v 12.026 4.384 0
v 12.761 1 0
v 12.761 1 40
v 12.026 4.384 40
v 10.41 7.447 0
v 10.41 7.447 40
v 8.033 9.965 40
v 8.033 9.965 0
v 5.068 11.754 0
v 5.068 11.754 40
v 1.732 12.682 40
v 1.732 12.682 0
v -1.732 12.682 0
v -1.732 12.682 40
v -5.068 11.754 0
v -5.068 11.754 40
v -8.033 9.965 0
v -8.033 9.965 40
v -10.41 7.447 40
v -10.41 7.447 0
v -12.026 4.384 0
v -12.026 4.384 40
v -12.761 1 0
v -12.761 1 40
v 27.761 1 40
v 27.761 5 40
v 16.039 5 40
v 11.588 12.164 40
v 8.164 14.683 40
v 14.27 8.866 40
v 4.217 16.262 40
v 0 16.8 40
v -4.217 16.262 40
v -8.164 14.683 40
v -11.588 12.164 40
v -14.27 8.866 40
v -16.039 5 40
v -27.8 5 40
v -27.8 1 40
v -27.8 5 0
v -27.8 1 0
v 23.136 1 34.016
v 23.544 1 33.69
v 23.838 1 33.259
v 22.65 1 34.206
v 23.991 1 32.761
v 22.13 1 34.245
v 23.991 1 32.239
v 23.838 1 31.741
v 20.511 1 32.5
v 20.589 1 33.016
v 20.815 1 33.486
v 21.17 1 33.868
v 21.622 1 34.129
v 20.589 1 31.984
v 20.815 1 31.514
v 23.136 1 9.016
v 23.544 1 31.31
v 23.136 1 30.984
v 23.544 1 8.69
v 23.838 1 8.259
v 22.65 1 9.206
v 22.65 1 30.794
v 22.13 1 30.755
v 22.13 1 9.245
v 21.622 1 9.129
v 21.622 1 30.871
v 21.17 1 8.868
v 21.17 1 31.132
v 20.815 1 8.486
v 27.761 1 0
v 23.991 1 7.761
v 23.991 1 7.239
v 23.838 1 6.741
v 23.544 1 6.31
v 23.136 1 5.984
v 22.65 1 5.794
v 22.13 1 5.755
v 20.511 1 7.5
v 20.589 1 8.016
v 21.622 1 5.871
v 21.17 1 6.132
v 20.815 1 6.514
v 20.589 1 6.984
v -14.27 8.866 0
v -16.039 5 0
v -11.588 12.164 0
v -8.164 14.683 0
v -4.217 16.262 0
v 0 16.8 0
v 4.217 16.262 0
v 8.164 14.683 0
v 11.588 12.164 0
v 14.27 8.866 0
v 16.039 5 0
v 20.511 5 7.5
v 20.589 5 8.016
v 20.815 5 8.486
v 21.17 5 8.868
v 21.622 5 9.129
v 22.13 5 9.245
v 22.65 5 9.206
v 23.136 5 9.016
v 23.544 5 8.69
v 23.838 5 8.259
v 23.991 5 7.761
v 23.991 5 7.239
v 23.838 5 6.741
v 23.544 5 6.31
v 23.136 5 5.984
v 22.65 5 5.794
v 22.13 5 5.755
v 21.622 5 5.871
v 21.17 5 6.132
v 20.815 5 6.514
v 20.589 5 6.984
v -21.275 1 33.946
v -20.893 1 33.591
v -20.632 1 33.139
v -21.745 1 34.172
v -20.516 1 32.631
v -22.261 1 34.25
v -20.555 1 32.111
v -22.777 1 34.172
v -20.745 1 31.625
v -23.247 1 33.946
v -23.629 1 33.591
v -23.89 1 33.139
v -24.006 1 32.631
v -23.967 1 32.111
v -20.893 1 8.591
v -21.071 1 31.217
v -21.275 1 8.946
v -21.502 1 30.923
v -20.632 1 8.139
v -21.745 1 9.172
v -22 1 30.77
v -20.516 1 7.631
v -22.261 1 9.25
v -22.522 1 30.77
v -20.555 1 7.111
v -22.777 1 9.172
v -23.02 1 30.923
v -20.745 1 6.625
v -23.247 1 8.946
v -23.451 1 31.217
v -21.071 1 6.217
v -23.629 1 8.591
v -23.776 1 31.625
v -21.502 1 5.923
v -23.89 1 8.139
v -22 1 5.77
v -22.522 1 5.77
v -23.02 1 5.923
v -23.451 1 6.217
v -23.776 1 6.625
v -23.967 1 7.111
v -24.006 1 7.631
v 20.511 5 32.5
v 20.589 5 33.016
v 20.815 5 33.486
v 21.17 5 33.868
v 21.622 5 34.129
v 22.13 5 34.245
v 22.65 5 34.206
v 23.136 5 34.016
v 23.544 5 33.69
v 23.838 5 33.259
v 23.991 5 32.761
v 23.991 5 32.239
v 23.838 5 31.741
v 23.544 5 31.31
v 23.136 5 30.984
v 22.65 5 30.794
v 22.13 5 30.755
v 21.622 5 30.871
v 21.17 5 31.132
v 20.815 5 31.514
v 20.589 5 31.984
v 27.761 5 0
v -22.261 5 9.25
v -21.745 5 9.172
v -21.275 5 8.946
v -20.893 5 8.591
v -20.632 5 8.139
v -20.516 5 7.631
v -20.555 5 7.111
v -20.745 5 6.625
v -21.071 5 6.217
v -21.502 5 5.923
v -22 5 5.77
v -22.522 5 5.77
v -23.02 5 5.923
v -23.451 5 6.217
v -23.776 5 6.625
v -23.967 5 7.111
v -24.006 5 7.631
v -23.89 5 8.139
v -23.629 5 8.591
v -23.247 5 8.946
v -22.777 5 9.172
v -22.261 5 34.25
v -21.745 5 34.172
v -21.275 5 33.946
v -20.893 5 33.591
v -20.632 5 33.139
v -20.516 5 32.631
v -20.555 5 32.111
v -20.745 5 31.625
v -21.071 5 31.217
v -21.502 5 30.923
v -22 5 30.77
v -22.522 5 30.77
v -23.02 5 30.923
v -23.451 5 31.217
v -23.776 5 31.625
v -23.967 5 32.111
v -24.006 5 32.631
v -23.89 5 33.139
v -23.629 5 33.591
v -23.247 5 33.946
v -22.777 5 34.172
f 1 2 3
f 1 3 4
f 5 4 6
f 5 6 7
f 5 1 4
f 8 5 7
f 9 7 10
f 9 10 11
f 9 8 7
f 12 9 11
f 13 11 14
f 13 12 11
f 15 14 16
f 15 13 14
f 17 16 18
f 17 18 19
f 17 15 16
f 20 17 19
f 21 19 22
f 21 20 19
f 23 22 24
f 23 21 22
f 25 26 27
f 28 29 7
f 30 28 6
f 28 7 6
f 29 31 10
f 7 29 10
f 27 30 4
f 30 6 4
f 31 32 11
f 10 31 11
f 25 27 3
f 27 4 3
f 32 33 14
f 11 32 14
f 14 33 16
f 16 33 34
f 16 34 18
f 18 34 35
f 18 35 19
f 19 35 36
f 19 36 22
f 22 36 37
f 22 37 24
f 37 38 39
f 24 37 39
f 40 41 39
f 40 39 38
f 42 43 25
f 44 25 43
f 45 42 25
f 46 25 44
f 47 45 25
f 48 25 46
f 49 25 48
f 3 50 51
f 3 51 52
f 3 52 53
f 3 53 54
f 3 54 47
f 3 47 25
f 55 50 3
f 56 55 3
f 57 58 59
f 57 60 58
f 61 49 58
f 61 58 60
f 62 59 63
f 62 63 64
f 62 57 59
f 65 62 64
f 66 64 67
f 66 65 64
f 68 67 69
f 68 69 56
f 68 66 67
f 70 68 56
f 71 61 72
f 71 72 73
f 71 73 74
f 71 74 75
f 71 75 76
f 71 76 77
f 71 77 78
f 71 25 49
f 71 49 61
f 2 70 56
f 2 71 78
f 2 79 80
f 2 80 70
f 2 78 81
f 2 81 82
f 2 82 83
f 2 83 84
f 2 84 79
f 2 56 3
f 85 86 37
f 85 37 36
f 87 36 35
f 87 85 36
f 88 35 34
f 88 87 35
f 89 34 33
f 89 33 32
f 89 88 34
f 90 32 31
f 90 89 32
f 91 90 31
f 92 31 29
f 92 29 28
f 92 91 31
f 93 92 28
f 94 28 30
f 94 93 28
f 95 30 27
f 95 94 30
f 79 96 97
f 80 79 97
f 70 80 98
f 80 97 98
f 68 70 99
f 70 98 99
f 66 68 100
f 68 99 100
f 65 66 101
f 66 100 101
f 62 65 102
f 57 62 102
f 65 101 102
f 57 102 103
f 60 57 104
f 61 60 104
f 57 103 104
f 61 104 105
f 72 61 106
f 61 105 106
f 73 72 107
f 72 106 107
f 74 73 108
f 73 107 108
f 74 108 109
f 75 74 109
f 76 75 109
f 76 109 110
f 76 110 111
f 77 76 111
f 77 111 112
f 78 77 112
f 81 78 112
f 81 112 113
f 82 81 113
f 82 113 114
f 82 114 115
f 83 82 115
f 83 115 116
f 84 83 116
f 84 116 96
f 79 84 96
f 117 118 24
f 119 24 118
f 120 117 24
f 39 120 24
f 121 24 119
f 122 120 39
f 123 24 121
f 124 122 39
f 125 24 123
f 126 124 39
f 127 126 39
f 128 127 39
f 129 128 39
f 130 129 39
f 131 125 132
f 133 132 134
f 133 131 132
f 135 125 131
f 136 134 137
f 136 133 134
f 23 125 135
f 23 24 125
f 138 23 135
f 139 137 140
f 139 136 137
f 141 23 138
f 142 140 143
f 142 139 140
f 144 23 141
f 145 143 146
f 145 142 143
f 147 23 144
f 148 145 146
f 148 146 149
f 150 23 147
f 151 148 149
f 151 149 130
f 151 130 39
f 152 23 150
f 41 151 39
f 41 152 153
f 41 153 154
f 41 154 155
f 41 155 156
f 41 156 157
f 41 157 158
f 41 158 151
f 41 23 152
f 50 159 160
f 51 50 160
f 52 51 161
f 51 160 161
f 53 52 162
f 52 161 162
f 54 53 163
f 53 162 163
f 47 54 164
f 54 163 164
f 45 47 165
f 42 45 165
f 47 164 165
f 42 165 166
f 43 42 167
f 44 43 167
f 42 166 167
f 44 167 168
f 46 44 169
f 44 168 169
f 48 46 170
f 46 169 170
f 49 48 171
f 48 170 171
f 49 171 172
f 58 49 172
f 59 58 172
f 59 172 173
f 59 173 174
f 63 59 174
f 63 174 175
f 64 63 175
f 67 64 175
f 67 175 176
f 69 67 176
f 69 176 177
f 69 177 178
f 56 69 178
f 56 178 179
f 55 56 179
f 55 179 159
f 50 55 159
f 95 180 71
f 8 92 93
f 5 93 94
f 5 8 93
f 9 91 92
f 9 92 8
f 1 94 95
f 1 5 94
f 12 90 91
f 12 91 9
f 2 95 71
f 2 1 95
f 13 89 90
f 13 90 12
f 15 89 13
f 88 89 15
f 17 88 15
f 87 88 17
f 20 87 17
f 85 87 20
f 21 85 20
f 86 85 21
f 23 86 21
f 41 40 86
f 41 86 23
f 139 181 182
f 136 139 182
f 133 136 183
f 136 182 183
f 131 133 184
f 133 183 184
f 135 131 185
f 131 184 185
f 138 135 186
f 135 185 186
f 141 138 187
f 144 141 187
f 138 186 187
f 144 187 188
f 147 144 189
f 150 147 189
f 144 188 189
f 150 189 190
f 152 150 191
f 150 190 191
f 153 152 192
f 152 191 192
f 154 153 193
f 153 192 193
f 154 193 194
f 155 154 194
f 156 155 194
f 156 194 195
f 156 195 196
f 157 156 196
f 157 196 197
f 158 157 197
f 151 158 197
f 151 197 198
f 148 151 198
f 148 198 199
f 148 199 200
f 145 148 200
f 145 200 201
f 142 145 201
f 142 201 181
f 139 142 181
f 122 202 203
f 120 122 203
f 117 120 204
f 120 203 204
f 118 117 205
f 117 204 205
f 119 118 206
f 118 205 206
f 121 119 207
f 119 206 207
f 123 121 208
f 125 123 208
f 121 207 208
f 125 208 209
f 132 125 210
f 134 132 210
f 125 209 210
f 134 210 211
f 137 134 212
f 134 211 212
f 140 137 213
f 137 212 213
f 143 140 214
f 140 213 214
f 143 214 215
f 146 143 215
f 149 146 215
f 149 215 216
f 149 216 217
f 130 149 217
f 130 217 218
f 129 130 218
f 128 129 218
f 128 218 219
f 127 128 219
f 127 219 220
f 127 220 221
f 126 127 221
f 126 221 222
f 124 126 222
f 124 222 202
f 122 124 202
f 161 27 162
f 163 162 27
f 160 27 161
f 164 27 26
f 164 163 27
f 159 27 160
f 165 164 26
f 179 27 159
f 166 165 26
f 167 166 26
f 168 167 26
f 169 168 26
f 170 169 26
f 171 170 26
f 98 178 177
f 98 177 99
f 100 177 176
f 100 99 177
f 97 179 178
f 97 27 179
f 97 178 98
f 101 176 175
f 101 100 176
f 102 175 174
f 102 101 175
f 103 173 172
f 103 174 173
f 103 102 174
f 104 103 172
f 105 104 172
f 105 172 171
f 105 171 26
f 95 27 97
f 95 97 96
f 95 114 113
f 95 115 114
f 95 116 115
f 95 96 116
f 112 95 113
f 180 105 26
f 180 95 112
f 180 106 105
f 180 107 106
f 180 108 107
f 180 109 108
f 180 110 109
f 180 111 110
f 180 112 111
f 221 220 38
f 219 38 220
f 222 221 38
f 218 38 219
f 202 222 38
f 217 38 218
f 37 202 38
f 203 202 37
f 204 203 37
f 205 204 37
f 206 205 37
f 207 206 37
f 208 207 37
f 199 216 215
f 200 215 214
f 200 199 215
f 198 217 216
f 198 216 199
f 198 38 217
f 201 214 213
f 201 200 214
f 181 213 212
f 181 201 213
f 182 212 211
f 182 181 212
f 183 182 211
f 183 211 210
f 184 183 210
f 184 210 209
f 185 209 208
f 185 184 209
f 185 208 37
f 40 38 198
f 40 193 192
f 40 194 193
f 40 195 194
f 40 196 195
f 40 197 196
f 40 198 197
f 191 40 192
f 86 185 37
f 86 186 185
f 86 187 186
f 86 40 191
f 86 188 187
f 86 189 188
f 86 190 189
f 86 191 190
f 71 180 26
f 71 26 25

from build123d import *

# Parameters (mm, degrees)
BOSS_EXTRUDE1_DEPTH = 40
CUT_EXTRUDE1_REACH  = 52.121
SKETCH2_R           = 1.75


with BuildPart() as part:
    # Sketch1 → Boss-Extrude1 (new body)
    with BuildSketch(Plane(origin=(0, 0, 0), x_dir=(0, 1, 0), z_dir=(0, 0, 1))):
        with BuildLine():
            Line((1, 12.760877713), (1, 27.8))
            Line((1, 27.8), (5, 27.8))
            Line((5, 27.8), (5, 16.038703189))
            ThreePointArc((5, 16.038703189), (16.8, 0), (5, -16.038703189))
            Line((5, -16.038703189), (5, -27.760877713))
            Line((5, -27.760877713), (1, -27.760877713))
            Line((1, -27.760877713), (1, -12.760877713))
            ThreePointArc((1, -12.760877713), (12.8, 0), (1, 12.760877713))
        make_face()
    extrude(amount=BOSS_EXTRUDE1_DEPTH)

    # Sketch2 → Cut-Extrude1 (cut, up to next)
    with BuildSketch(Plane(origin=(0, 5, 0), x_dir=(-1, 0, 0), z_dir=(0, 1, 0)), mode=Mode.PRIVATE) as cut_extrude1_sk1:
        with Locations((-22.260877713, 32.5)):
            Circle(SKETCH2_R)
    cut_extrude1_tool1 = extrude(cut_extrude1_sk1.sketch, amount=-CUT_EXTRUDE1_REACH, mode=Mode.PRIVATE) & part.part
    # Sketch2 → Cut-Extrude1 (cut, up to next)
    with BuildSketch(Plane(origin=(0, 5, 0), x_dir=(-1, 0, 0), z_dir=(0, 1, 0)), mode=Mode.PRIVATE) as cut_extrude1_sk2:
        with Locations((-22.260877713, 7.5)):
            Circle(SKETCH2_R)
    cut_extrude1_tool2 = extrude(cut_extrude1_sk2.sketch, amount=-CUT_EXTRUDE1_REACH, mode=Mode.PRIVATE) & part.part
    # Sketch2 → Cut-Extrude1 (cut, up to next)
    with BuildSketch(Plane(origin=(0, 5, 0), x_dir=(-1, 0, 0), z_dir=(0, 1, 0)), mode=Mode.PRIVATE) as cut_extrude1_sk3:
        with Locations(Location((22.260877713, 7.5, 0), (0, 0, 90))):
            Circle(SKETCH2_R)
    cut_extrude1_tool3 = extrude(cut_extrude1_sk3.sketch, amount=-CUT_EXTRUDE1_REACH, mode=Mode.PRIVATE) & part.part
    # Sketch2 → Cut-Extrude1 (cut, up to next)
    with BuildSketch(Plane(origin=(0, 5, 0), x_dir=(-1, 0, 0), z_dir=(0, 1, 0)), mode=Mode.PRIVATE) as cut_extrude1_sk4:
        with Locations(Location((22.260877713, 32.5, 0), (0, 0, 90))):
            Circle(SKETCH2_R)
    cut_extrude1_tool4 = extrude(cut_extrude1_sk4.sketch, amount=-CUT_EXTRUDE1_REACH, mode=Mode.PRIVATE) & part.part
    add(cut_extrude1_tool1.solids().sort_by_distance((22.260878, 5, 32.5))[0], mode=Mode.SUBTRACT)
    add(cut_extrude1_tool2.solids().sort_by_distance((22.260878, 5, 7.5))[0], mode=Mode.SUBTRACT)
    add(cut_extrude1_tool3.solids().sort_by_distance((-22.260878, 5, 7.5))[0], mode=Mode.SUBTRACT)
    add(cut_extrude1_tool4.solids().sort_by_distance((-22.260878, 5, 32.5))[0], mode=Mode.SUBTRACT)


solid = part.part
